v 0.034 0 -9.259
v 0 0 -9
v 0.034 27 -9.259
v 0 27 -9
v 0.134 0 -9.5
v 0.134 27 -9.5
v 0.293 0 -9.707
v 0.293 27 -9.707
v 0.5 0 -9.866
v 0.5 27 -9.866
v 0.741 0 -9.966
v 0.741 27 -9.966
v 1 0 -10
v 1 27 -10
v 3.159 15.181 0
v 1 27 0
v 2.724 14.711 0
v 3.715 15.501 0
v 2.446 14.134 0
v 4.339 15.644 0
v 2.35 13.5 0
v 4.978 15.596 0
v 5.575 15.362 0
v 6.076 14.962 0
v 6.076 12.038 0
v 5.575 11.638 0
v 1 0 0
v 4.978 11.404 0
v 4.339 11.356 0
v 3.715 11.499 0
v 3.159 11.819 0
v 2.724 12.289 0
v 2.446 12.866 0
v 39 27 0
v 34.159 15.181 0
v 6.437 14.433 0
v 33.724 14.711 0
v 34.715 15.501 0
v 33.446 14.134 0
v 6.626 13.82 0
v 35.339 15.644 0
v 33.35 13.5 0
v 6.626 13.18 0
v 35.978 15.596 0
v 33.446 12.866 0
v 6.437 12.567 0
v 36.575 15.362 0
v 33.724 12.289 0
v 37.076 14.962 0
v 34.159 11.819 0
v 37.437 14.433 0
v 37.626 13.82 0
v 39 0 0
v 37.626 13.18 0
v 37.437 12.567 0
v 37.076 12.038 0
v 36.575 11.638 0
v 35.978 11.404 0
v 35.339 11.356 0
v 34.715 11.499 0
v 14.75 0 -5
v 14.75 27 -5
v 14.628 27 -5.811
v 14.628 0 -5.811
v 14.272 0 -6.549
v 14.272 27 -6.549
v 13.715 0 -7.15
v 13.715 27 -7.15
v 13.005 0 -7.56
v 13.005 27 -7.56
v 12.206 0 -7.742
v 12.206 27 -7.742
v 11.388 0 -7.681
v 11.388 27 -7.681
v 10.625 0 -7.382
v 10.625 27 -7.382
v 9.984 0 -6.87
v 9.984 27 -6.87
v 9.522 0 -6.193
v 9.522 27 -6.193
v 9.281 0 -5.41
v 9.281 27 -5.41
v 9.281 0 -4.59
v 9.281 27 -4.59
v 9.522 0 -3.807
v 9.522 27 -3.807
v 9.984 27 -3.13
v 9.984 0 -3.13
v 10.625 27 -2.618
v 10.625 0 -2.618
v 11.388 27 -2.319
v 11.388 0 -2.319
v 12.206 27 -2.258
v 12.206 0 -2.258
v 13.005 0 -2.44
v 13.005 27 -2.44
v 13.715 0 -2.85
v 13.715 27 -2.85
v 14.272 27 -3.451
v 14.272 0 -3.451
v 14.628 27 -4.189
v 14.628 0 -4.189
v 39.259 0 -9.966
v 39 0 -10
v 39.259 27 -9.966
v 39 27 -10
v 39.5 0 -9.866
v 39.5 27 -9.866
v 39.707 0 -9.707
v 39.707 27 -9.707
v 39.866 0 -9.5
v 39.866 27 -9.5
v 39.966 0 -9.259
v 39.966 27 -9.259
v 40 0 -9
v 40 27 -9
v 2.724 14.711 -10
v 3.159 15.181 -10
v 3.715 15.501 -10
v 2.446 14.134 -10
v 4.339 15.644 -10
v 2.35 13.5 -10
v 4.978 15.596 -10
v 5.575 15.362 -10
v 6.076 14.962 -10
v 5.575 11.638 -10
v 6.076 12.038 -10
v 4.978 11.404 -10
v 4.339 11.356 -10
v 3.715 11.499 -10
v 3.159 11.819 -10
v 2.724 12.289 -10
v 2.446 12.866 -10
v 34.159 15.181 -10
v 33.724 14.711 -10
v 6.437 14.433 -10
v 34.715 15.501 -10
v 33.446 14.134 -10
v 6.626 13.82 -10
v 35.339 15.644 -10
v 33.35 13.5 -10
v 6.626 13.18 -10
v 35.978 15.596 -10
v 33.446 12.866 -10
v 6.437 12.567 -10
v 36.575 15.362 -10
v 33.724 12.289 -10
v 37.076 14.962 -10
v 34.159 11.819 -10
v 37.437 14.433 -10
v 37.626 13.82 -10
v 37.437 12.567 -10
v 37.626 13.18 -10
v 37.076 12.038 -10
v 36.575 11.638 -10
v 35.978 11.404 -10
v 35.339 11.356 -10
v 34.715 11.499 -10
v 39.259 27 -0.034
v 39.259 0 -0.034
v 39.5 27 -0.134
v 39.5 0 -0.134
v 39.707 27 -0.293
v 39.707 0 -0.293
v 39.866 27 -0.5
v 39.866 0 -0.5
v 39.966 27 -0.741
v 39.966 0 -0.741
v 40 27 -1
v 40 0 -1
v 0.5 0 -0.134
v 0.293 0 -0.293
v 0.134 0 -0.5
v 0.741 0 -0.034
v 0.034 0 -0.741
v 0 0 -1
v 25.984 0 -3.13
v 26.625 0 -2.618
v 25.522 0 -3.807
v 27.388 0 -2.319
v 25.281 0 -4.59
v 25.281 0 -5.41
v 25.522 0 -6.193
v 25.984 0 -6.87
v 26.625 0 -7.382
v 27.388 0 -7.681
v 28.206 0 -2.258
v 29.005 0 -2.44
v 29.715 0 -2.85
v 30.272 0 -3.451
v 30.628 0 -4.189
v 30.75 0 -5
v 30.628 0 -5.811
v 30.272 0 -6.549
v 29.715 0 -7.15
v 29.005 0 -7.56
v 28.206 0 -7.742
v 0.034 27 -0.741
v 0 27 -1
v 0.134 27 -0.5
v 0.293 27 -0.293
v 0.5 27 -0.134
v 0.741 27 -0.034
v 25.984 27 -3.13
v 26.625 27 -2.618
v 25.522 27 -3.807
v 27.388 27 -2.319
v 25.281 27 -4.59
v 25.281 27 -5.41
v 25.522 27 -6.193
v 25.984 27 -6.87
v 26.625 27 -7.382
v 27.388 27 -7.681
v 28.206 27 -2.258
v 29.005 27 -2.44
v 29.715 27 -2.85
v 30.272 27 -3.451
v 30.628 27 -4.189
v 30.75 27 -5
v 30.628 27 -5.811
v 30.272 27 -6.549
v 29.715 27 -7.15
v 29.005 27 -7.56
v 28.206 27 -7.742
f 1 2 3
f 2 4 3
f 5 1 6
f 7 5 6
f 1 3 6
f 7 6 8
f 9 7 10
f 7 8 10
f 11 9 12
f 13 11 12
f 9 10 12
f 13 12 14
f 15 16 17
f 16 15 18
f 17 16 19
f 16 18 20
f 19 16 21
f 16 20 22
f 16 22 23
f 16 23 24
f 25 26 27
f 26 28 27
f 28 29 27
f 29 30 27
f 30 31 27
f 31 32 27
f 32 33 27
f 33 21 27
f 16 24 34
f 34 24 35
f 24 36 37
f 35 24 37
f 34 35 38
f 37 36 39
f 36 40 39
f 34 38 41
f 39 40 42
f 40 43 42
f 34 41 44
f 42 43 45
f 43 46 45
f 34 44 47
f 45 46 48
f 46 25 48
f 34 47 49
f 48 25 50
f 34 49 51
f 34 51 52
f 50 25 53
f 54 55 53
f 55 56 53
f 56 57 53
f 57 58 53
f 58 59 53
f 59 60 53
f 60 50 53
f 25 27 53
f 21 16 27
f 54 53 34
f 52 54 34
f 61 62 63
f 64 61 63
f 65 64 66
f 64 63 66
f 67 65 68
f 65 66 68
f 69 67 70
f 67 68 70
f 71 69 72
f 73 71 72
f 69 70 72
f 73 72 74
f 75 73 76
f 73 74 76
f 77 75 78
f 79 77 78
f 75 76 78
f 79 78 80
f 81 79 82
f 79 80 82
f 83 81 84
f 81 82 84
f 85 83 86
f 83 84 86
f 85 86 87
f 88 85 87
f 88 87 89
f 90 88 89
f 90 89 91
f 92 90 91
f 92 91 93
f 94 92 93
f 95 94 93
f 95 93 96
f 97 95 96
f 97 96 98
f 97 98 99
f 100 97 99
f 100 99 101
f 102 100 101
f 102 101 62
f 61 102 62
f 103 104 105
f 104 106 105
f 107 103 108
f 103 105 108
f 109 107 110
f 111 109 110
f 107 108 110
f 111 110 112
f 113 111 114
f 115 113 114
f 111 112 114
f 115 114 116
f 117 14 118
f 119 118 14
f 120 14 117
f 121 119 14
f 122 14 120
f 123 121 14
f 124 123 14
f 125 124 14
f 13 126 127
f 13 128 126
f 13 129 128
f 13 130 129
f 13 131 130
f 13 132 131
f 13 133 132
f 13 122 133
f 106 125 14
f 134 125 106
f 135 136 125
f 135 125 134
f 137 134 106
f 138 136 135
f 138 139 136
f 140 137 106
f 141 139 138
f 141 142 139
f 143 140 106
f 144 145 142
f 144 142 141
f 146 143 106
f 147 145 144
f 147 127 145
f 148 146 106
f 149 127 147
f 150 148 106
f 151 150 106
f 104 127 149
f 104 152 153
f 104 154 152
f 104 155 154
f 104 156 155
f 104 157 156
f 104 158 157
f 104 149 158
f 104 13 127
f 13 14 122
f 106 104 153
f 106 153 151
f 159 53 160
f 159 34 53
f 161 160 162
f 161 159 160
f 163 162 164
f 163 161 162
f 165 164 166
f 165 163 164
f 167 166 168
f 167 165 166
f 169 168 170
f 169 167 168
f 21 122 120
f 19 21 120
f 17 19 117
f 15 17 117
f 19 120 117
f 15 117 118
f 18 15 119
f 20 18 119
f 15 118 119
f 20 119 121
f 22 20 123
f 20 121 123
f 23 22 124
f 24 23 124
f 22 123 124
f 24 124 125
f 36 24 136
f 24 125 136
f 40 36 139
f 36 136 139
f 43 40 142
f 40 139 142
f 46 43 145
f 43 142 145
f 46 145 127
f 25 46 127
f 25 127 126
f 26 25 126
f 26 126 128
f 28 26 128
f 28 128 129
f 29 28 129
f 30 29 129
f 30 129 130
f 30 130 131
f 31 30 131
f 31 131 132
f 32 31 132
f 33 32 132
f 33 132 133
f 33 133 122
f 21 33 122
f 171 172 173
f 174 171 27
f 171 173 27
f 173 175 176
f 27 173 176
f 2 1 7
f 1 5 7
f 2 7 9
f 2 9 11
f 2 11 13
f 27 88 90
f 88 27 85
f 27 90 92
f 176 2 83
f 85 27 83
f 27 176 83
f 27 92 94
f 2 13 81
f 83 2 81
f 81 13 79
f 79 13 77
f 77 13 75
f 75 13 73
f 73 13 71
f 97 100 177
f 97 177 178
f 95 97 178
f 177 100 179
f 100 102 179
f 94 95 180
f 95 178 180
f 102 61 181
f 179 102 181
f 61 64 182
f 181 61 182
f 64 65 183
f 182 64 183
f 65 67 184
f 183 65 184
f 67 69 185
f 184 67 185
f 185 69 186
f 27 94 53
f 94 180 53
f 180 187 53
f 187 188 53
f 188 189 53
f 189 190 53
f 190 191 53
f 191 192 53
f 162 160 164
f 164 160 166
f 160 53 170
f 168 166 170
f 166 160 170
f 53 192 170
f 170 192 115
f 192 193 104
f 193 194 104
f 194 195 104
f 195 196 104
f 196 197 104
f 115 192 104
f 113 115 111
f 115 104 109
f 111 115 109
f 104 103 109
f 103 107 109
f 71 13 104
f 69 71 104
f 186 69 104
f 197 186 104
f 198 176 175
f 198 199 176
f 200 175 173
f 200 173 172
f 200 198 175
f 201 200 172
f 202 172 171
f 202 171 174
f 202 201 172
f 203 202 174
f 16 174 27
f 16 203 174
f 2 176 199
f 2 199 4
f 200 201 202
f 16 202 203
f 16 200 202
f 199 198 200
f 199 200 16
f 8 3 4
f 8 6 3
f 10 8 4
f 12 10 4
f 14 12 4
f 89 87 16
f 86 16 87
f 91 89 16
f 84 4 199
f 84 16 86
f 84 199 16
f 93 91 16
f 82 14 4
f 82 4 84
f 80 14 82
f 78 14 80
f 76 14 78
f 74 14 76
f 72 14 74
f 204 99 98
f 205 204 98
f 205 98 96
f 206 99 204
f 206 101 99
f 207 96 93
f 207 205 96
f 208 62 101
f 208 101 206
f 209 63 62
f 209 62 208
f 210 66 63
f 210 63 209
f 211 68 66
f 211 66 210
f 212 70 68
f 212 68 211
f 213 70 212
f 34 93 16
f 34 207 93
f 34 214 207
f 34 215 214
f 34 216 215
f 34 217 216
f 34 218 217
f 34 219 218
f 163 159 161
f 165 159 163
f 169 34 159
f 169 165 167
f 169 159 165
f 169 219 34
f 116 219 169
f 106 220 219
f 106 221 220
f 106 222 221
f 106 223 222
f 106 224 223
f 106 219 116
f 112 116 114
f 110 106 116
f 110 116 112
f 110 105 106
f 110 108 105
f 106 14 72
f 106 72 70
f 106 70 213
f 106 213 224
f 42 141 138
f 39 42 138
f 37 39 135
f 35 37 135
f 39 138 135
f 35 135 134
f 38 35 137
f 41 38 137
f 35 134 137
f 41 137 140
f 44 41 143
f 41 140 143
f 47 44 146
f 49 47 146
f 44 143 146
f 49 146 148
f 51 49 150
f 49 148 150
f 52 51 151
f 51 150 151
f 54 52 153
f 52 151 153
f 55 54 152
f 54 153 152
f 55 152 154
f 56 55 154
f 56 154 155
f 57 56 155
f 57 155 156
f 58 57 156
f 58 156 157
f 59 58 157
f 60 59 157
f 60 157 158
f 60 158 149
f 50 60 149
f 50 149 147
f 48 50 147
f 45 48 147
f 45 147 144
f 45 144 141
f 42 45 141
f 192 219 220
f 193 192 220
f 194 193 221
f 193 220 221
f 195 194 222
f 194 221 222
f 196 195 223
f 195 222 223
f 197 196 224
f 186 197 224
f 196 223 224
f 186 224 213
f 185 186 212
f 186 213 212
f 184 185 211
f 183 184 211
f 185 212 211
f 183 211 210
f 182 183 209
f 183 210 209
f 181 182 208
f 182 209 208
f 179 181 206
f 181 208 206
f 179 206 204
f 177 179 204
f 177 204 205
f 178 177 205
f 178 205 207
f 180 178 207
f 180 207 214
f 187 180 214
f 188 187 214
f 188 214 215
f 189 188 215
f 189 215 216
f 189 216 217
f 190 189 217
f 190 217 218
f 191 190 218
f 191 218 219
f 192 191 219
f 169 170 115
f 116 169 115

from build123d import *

# Parameters (mm, degrees)
SKETCH1_W               = 40
SKETCH1_H               = 10
BOSS_EXTRUDE1_DEPTH     = 27
SKETCH4_R               = 2.15
CUT_EXTRUDE1_DEPTH      = 1
CUT_EXTRUDE1_DEPTH_BACK = 11
FILLET1_R               = 1
SKETCH5_R               = 2.75
CUT_EXTRUDE2_DEPTH      = 1
CUT_EXTRUDE2_DEPTH_BACK = 28


with BuildPart() as part:
    # Sketch1 → Boss-Extrude1 (new body)
    with BuildSketch(Plane(origin=(0, 0, 0), x_dir=(1, 0, 0), z_dir=(0, 1, 0))):
        with Locations((20, 5)):
            Rectangle(SKETCH1_W, SKETCH1_H)
    extrude(amount=BOSS_EXTRUDE1_DEPTH)

    # Sketch4 → Cut-Extrude1 (cut, two sides)
    with BuildSketch(Plane(origin=(0, 0, -10), x_dir=(-1, 0, 0), z_dir=(0, 0, -1))) as cut_extrude1_sk:
        with Locations((-35.5, 13.5)):
            Circle(SKETCH4_R)
        with Locations((-4.5, 13.5)):
            Circle(SKETCH4_R)
    extrude(amount=CUT_EXTRUDE1_DEPTH, mode=Mode.SUBTRACT)
    extrude(cut_extrude1_sk.sketch, amount=-CUT_EXTRUDE1_DEPTH_BACK, mode=Mode.SUBTRACT)

    # Fillet1
    fillet1_edges = [part.edges().sort_by_distance(p)[0] for p in [
        (0, 13.5, -10),
        (40, 13.5, -10),
        (40, 13.5, 0),
        (0, 13.5, 0),
    ]]
    fillet(fillet1_edges, radius=FILLET1_R)

    # Sketch5 → Cut-Extrude2 (cut, two sides)
    with BuildSketch(Plane(origin=(0, 27, 0), x_dir=(1, 0, 0), z_dir=(0, 1, 0))) as cut_extrude2_sk:
        with Locations((12, 5)):
            Circle(SKETCH5_R)
        with Locations((28, 5)):
            Circle(SKETCH5_R)
    extrude(amount=CUT_EXTRUDE2_DEPTH, mode=Mode.SUBTRACT)
    extrude(cut_extrude2_sk.sketch, amount=-CUT_EXTRUDE2_DEPTH_BACK, mode=Mode.SUBTRACT)


solid = part.part
